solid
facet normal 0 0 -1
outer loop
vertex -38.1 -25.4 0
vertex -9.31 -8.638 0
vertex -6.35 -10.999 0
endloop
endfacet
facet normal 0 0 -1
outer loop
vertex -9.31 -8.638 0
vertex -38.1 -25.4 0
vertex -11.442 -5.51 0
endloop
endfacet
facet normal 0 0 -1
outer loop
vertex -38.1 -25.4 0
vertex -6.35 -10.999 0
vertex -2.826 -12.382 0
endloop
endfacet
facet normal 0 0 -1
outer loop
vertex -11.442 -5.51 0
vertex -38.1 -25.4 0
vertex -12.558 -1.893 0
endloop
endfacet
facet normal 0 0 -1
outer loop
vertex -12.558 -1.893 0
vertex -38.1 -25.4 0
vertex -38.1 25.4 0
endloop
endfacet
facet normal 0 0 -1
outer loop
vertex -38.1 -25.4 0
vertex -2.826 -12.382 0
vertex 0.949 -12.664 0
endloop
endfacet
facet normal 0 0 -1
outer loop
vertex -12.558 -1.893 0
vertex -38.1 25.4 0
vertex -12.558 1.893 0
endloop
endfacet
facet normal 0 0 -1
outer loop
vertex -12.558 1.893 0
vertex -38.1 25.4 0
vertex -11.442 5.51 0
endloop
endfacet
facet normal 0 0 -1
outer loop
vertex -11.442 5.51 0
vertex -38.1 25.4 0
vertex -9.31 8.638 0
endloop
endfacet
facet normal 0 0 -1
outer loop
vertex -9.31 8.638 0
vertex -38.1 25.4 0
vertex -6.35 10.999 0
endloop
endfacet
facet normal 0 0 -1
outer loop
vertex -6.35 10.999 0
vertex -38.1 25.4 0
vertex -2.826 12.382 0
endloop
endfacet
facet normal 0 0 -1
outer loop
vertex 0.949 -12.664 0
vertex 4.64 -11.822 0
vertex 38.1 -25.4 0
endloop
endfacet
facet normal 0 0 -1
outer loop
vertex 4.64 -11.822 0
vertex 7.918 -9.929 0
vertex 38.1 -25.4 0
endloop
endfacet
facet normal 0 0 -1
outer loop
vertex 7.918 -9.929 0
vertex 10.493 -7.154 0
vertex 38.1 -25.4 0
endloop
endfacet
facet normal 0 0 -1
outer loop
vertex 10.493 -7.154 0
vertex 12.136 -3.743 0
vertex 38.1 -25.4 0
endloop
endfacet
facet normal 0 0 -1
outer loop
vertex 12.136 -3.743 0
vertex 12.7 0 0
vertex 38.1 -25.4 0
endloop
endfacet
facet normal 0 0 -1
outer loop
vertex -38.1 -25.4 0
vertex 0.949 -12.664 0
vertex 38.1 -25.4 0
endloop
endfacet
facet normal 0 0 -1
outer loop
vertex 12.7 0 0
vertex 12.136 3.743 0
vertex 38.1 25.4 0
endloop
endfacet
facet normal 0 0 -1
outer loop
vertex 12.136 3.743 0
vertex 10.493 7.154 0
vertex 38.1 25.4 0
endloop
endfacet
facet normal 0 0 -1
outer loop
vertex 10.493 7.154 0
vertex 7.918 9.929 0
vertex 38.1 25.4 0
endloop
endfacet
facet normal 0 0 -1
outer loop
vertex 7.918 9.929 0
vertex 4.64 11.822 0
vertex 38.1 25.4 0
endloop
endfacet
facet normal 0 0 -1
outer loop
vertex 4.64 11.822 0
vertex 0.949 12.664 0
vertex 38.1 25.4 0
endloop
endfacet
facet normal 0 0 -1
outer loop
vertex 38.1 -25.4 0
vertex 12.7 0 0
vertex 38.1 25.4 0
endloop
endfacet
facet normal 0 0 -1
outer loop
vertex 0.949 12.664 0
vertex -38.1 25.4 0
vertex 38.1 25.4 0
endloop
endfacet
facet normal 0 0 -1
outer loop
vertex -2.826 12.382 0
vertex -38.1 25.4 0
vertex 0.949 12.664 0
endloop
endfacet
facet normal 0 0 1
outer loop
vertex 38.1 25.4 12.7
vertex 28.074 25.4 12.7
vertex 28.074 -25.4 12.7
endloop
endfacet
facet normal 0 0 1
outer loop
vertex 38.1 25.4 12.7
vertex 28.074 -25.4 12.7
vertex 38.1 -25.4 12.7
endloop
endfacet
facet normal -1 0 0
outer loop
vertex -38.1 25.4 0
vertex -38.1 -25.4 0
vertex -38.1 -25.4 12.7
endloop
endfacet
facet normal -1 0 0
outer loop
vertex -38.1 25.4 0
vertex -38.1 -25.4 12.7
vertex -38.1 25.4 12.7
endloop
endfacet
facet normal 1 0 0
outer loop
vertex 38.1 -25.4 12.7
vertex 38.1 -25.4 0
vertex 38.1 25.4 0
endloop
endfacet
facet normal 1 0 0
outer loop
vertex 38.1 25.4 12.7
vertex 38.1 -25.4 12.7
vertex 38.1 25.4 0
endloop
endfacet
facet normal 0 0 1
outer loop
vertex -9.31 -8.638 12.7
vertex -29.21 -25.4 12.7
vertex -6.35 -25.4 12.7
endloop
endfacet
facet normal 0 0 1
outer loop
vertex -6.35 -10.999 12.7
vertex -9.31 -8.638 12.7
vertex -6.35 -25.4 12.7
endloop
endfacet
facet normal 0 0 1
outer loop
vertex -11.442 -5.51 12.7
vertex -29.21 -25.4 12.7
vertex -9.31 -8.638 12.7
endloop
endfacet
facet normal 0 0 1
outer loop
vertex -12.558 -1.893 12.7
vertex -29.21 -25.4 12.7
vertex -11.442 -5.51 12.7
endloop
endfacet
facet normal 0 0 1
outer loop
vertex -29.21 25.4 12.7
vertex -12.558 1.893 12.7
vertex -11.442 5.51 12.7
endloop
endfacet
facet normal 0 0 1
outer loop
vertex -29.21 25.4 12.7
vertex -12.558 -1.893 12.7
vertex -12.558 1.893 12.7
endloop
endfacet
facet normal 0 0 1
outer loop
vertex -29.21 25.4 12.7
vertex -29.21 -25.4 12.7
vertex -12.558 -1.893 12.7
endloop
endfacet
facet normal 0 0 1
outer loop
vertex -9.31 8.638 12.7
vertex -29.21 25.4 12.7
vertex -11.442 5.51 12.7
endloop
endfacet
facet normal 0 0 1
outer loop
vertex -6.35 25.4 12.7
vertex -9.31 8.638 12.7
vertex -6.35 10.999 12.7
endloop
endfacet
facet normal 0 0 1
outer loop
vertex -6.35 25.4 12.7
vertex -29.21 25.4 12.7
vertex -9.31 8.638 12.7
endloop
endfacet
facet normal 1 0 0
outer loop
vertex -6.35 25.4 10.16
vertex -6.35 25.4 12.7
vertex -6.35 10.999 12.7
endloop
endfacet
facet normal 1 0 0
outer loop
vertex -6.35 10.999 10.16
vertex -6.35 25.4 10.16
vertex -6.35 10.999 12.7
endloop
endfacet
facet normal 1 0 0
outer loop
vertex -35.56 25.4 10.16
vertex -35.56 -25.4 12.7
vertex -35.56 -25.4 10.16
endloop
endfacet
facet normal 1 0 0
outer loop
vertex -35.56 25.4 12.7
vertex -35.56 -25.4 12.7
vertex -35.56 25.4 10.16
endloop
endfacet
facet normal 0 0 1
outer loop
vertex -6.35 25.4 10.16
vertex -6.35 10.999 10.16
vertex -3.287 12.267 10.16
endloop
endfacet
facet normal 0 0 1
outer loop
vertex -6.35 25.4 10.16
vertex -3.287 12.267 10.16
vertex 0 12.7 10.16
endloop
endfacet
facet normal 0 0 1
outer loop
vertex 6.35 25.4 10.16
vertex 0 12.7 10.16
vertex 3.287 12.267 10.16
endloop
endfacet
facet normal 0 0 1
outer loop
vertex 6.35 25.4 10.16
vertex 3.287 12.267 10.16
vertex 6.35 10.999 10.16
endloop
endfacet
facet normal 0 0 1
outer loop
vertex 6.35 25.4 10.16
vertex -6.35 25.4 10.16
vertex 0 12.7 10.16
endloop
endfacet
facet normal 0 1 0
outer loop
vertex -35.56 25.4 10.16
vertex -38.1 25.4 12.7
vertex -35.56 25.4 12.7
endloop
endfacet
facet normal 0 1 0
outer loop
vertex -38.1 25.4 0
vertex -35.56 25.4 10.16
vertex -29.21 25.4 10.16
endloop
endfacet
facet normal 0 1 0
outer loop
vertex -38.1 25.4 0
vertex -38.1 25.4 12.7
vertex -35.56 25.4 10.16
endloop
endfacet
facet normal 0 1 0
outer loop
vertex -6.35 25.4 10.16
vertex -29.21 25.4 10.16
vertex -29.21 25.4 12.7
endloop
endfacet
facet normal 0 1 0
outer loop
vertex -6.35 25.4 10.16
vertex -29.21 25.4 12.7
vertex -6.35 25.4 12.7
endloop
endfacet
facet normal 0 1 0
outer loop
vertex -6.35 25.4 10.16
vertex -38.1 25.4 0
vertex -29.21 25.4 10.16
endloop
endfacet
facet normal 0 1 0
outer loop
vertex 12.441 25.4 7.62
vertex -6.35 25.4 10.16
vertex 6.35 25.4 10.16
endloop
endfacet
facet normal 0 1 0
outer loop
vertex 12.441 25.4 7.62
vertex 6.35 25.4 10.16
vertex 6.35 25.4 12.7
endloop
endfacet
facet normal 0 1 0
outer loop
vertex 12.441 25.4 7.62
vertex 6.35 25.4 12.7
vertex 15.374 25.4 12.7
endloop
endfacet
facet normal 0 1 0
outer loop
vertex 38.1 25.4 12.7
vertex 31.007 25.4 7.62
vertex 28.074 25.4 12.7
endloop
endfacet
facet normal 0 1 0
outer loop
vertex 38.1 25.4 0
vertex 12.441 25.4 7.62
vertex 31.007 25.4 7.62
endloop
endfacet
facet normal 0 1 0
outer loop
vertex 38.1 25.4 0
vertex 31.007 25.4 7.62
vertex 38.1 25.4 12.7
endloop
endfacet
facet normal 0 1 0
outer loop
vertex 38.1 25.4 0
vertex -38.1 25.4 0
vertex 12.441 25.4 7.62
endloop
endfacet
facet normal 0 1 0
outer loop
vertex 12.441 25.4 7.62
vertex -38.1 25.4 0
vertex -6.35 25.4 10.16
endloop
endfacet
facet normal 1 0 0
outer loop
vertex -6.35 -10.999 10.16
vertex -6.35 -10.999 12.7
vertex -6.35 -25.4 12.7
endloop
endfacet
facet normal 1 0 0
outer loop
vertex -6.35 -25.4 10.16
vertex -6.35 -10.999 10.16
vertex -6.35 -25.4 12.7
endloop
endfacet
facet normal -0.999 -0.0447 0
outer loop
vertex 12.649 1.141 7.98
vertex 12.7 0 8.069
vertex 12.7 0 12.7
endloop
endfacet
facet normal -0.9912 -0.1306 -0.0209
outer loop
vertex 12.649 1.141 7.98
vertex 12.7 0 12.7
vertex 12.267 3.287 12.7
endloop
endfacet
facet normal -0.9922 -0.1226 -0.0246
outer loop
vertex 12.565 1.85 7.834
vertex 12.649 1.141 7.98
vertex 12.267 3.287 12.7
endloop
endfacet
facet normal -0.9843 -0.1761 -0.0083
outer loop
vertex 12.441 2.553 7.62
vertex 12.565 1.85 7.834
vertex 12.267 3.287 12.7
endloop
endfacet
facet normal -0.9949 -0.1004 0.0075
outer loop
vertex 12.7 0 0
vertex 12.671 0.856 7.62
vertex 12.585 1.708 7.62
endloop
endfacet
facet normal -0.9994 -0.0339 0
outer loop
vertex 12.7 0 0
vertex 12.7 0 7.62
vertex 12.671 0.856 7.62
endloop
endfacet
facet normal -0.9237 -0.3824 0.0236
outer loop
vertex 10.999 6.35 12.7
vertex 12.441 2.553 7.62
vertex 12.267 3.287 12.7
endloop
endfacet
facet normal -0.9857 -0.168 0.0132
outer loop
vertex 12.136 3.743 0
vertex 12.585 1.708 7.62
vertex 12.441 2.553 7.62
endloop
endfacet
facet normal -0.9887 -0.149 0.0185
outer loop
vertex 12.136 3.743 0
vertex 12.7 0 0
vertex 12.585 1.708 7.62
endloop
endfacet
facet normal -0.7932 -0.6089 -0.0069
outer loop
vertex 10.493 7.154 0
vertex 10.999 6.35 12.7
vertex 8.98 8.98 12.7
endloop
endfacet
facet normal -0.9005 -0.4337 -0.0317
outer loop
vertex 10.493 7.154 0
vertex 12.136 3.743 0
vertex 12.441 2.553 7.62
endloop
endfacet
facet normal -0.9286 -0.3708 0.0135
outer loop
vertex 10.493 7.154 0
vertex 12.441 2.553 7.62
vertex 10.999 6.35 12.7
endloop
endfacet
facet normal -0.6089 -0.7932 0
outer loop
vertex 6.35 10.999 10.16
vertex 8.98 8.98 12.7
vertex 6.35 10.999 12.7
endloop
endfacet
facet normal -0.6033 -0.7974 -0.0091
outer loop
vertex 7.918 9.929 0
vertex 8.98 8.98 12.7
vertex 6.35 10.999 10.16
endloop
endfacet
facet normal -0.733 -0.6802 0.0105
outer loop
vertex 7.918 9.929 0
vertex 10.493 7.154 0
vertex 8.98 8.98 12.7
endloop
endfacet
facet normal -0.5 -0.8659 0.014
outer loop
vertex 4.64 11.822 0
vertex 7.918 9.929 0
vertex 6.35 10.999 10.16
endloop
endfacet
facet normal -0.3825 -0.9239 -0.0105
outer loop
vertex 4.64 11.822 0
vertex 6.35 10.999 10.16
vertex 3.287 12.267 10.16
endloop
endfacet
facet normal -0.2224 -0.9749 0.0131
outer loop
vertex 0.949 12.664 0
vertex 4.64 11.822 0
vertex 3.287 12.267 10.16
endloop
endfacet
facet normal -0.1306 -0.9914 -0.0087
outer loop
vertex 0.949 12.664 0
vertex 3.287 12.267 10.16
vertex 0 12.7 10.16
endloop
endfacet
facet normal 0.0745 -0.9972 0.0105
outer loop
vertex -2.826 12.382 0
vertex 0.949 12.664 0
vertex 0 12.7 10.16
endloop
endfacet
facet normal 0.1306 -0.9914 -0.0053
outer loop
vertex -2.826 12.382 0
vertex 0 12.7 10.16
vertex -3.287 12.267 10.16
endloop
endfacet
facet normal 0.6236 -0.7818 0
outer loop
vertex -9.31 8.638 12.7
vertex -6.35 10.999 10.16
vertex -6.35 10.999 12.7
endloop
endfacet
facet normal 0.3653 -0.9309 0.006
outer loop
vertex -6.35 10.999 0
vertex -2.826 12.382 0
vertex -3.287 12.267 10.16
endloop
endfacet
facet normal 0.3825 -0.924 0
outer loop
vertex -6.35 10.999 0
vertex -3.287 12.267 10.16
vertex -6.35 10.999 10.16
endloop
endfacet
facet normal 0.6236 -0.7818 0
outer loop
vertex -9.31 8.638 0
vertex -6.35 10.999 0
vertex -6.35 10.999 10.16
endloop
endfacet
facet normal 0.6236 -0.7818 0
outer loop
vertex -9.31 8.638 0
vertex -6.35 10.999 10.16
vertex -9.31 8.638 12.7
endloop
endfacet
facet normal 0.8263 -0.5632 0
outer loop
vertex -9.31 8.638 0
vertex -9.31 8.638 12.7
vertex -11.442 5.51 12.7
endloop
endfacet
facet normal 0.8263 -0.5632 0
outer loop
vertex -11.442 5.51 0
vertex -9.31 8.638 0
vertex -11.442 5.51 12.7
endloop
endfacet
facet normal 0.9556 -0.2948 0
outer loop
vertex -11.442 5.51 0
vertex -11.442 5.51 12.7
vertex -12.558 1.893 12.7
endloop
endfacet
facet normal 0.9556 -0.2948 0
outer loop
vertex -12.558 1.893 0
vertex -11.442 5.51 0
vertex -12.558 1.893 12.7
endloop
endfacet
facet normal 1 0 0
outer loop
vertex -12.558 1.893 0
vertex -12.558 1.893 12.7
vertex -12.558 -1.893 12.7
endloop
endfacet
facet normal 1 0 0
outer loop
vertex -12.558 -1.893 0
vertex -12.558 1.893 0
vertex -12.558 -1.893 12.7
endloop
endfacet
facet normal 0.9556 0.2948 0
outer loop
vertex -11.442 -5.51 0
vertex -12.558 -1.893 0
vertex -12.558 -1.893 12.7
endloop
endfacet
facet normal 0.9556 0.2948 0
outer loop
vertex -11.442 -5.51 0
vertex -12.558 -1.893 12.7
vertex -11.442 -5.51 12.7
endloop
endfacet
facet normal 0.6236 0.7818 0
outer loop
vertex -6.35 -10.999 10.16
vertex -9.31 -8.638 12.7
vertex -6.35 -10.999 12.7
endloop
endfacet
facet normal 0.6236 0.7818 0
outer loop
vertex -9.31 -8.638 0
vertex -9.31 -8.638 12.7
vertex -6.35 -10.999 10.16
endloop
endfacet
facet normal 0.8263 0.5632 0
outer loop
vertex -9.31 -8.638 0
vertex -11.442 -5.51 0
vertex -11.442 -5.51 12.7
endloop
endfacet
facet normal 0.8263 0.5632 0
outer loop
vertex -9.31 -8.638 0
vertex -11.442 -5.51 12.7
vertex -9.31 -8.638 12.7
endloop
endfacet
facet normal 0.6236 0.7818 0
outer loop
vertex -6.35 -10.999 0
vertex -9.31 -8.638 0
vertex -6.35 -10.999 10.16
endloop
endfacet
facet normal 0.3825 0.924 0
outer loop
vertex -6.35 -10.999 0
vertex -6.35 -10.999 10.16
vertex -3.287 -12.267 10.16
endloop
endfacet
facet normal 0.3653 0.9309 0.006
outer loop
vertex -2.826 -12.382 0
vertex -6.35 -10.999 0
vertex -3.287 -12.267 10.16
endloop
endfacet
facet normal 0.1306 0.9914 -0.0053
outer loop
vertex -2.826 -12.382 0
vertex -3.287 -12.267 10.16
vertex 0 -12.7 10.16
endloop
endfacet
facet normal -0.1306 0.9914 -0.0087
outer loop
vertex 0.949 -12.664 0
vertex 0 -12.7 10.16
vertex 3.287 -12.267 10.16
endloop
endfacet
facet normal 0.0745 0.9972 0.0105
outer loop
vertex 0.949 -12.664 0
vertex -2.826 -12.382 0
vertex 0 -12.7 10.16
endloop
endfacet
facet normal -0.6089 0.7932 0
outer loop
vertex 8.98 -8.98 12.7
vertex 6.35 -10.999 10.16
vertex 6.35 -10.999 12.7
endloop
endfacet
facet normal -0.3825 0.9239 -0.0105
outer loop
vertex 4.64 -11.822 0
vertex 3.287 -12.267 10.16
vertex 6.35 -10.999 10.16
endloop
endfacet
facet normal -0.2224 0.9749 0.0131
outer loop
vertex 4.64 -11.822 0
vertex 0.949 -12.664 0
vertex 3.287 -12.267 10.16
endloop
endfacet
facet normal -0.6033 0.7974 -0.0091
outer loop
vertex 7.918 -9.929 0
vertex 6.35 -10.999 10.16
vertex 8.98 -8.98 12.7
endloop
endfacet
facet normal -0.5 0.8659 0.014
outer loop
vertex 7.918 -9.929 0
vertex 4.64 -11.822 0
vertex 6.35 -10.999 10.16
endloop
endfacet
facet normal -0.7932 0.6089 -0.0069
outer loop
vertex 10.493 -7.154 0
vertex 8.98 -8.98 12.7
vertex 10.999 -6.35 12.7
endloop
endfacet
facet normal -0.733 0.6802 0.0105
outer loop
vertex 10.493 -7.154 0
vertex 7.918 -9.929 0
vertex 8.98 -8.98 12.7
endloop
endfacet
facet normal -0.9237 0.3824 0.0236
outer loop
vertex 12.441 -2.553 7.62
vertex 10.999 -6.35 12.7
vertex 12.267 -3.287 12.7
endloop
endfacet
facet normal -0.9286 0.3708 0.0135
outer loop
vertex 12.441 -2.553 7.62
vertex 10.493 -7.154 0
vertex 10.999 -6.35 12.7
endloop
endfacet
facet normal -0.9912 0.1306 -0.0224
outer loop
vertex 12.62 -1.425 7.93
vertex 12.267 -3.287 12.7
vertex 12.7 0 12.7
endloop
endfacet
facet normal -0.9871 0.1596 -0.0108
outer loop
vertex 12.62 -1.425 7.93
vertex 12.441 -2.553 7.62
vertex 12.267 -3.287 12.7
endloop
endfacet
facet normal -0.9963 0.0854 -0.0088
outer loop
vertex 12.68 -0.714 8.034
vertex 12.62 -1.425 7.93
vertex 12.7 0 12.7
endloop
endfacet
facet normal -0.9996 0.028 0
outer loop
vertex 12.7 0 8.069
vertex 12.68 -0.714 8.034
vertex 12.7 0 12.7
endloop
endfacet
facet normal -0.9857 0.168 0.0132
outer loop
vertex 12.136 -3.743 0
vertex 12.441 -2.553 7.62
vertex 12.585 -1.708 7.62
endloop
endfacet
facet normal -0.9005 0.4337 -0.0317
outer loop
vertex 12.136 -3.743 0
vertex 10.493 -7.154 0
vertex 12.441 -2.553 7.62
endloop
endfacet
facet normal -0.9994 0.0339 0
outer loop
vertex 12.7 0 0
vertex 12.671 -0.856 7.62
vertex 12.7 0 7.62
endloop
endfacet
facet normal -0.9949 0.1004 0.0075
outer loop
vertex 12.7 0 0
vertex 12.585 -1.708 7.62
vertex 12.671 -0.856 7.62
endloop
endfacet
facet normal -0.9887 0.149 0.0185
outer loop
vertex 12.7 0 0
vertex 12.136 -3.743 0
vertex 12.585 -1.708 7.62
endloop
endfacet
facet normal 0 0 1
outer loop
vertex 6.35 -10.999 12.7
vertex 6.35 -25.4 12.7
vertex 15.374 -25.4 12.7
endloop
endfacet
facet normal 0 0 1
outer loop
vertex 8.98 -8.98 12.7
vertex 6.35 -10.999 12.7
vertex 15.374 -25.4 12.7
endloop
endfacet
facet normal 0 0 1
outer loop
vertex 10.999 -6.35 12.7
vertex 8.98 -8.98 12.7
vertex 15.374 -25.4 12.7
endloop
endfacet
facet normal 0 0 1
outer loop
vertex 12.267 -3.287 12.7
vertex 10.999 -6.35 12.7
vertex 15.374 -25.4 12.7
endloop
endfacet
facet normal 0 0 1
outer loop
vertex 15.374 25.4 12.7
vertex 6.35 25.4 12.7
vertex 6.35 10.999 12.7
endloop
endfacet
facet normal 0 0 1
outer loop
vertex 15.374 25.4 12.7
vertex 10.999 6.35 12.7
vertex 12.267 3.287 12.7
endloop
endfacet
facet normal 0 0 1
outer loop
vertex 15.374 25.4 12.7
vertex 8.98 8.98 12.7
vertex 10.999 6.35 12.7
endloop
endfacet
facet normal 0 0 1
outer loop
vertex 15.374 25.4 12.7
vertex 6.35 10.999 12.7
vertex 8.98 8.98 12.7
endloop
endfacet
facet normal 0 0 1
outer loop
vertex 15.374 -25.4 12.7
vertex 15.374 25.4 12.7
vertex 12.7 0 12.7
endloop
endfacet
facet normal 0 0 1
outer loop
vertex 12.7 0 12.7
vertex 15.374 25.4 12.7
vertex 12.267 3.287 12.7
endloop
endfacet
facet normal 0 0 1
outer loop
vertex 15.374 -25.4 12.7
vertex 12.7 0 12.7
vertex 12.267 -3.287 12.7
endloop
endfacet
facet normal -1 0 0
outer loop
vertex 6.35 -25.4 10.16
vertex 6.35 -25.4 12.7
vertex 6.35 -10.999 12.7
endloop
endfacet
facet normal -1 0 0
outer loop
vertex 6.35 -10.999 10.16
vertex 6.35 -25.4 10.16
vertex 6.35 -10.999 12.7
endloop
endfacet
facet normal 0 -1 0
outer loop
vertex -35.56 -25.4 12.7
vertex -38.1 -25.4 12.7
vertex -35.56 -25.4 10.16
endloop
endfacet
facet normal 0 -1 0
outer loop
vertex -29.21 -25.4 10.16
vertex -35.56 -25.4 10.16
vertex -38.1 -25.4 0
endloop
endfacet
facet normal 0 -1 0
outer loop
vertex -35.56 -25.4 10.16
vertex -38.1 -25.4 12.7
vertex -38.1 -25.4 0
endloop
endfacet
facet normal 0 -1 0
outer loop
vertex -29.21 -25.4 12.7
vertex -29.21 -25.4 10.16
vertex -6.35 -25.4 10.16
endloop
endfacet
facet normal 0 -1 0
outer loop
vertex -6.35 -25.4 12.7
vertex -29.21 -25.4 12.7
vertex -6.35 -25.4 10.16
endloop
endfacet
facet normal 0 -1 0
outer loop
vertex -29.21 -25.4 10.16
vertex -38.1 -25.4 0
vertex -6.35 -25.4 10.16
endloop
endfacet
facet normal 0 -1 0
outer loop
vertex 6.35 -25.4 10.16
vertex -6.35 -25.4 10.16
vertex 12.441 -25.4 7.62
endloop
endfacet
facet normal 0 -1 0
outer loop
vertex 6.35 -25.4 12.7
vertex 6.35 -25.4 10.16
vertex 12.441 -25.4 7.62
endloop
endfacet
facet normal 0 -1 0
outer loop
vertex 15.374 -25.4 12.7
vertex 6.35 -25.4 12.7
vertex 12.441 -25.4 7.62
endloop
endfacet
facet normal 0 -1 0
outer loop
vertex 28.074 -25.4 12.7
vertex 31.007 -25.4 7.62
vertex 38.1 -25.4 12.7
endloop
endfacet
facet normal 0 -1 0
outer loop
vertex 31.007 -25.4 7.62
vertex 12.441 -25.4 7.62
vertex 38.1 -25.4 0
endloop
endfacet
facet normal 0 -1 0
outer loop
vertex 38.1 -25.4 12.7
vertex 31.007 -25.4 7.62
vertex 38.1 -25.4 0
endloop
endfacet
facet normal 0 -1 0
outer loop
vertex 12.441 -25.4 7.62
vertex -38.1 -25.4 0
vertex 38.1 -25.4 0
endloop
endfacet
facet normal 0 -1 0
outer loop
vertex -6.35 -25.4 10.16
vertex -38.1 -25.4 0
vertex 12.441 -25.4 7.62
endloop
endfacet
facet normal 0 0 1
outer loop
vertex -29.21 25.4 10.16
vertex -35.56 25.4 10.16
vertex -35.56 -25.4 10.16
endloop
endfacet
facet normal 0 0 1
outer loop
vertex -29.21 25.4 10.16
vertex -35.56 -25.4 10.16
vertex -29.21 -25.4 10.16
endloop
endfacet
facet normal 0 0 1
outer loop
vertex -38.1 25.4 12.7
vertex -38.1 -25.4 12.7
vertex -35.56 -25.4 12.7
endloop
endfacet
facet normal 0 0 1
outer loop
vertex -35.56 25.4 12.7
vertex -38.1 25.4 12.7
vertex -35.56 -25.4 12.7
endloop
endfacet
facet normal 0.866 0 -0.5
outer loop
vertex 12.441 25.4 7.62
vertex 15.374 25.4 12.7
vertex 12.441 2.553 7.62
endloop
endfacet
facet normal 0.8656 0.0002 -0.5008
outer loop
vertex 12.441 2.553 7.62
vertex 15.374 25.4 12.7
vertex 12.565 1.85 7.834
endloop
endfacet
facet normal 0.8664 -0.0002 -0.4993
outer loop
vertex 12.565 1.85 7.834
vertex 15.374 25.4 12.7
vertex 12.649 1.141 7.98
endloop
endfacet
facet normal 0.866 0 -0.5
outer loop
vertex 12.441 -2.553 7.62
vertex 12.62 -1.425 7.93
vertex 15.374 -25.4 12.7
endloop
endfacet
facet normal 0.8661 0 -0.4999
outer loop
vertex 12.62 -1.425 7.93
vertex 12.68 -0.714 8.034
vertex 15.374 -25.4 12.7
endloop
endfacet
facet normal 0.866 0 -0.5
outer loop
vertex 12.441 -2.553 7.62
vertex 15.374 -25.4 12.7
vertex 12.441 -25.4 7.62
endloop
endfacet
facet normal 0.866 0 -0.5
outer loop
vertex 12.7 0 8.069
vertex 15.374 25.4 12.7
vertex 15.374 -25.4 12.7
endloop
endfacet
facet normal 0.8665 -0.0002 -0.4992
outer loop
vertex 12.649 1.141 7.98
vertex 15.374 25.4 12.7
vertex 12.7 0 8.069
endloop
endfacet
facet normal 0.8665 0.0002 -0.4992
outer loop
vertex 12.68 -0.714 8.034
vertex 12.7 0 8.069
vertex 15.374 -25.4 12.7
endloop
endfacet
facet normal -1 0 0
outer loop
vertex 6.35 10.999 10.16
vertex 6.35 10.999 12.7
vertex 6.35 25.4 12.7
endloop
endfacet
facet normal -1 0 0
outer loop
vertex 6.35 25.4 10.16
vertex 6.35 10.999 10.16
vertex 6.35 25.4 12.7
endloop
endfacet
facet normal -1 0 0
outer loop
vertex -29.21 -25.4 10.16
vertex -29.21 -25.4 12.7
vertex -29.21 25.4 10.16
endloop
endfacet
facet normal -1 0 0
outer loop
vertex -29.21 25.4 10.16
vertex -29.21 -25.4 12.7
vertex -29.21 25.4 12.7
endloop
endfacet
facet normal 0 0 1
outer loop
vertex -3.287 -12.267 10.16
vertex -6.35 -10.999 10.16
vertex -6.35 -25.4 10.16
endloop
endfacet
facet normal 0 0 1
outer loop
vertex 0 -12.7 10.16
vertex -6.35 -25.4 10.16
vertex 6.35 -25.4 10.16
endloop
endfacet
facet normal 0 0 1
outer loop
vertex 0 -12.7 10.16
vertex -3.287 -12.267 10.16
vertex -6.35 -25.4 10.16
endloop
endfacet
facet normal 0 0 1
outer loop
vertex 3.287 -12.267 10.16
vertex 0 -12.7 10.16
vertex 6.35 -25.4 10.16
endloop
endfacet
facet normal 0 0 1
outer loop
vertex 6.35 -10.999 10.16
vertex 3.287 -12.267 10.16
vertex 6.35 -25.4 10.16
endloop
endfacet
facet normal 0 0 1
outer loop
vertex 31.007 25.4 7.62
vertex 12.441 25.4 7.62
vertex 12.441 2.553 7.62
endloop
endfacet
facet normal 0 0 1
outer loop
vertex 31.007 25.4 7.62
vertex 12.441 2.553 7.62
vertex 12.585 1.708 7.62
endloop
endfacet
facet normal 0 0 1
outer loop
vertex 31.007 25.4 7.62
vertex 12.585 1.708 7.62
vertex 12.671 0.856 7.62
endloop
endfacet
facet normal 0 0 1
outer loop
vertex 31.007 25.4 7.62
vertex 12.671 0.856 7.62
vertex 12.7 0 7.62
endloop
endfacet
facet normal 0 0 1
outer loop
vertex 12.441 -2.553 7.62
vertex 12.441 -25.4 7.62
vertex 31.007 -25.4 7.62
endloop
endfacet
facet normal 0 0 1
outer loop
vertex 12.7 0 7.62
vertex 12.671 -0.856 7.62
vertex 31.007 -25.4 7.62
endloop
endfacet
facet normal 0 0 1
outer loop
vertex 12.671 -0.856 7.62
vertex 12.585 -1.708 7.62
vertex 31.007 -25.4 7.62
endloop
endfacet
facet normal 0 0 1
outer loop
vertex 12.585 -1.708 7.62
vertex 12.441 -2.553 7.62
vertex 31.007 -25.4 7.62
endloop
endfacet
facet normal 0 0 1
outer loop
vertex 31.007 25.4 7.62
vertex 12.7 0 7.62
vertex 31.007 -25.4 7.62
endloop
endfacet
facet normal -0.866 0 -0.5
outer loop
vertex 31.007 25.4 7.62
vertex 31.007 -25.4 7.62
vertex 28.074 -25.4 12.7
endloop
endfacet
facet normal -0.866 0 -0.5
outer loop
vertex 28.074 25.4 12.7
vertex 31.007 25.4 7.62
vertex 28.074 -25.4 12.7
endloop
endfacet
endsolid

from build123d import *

# Parameters (mm, degrees)
F0_W     = 76.2
F0_H     = 50.8
F0_R     = 12.7
F1_DEPTH = 12.7
F2_W     = 6.35
F2_H     = 50.8
F3_DEPTH = 2.54
F5_DEPTH = 50.801


with BuildPart() as f1:
    # F0 (on Top) → F1 (new body)
    with BuildSketch(Plane.XY):
        Rectangle(F0_W, F0_H)
        Circle(F0_R, mode=Mode.SUBTRACT)
    extrude(amount=F1_DEPTH)

    # F2 (on face) → F3 (cut)
    with BuildSketch(Plane.XY.offset(12.7)):
        with Locations((-32.385, 0)):
            Rectangle(F2_W, F2_H)
        with BuildLine():
            Line((-6.35, -10.9985226281), (-6.35, -25.4))
            Line((-6.35, -25.4), (6.35, -25.4))
            Line((6.35, -25.4), (6.35, -10.9985226281))
            ThreePointArc((6.35, -10.9985226281), (0, -12.7), (-6.35, -10.9985226281))
        make_face()
        with BuildLine():
            Line((6.35, 25.4), (-6.35, 25.4))
            Line((-6.35, 25.4), (-6.35, 10.9985226281))
            ThreePointArc((-6.35, 10.9985226281), (0, 12.7), (6.35, 10.9985226281))
            Line((6.35, 10.9985226281), (6.35, 25.4))
        make_face()
    extrude(amount=-F3_DEPTH, mode=Mode.SUBTRACT)

    # F4 (on face) → F5 (cut, through all)
    with BuildSketch(Plane.XZ.offset(25.4)):
        Polygon((28.0736974643, 12.7), (15.3736974643, 12.7), (12.4407580968, 7.62), (31.0066368318, 7.62), align=None)
    extrude(amount=-F5_DEPTH, mode=Mode.SUBTRACT)


solid = f1.part
